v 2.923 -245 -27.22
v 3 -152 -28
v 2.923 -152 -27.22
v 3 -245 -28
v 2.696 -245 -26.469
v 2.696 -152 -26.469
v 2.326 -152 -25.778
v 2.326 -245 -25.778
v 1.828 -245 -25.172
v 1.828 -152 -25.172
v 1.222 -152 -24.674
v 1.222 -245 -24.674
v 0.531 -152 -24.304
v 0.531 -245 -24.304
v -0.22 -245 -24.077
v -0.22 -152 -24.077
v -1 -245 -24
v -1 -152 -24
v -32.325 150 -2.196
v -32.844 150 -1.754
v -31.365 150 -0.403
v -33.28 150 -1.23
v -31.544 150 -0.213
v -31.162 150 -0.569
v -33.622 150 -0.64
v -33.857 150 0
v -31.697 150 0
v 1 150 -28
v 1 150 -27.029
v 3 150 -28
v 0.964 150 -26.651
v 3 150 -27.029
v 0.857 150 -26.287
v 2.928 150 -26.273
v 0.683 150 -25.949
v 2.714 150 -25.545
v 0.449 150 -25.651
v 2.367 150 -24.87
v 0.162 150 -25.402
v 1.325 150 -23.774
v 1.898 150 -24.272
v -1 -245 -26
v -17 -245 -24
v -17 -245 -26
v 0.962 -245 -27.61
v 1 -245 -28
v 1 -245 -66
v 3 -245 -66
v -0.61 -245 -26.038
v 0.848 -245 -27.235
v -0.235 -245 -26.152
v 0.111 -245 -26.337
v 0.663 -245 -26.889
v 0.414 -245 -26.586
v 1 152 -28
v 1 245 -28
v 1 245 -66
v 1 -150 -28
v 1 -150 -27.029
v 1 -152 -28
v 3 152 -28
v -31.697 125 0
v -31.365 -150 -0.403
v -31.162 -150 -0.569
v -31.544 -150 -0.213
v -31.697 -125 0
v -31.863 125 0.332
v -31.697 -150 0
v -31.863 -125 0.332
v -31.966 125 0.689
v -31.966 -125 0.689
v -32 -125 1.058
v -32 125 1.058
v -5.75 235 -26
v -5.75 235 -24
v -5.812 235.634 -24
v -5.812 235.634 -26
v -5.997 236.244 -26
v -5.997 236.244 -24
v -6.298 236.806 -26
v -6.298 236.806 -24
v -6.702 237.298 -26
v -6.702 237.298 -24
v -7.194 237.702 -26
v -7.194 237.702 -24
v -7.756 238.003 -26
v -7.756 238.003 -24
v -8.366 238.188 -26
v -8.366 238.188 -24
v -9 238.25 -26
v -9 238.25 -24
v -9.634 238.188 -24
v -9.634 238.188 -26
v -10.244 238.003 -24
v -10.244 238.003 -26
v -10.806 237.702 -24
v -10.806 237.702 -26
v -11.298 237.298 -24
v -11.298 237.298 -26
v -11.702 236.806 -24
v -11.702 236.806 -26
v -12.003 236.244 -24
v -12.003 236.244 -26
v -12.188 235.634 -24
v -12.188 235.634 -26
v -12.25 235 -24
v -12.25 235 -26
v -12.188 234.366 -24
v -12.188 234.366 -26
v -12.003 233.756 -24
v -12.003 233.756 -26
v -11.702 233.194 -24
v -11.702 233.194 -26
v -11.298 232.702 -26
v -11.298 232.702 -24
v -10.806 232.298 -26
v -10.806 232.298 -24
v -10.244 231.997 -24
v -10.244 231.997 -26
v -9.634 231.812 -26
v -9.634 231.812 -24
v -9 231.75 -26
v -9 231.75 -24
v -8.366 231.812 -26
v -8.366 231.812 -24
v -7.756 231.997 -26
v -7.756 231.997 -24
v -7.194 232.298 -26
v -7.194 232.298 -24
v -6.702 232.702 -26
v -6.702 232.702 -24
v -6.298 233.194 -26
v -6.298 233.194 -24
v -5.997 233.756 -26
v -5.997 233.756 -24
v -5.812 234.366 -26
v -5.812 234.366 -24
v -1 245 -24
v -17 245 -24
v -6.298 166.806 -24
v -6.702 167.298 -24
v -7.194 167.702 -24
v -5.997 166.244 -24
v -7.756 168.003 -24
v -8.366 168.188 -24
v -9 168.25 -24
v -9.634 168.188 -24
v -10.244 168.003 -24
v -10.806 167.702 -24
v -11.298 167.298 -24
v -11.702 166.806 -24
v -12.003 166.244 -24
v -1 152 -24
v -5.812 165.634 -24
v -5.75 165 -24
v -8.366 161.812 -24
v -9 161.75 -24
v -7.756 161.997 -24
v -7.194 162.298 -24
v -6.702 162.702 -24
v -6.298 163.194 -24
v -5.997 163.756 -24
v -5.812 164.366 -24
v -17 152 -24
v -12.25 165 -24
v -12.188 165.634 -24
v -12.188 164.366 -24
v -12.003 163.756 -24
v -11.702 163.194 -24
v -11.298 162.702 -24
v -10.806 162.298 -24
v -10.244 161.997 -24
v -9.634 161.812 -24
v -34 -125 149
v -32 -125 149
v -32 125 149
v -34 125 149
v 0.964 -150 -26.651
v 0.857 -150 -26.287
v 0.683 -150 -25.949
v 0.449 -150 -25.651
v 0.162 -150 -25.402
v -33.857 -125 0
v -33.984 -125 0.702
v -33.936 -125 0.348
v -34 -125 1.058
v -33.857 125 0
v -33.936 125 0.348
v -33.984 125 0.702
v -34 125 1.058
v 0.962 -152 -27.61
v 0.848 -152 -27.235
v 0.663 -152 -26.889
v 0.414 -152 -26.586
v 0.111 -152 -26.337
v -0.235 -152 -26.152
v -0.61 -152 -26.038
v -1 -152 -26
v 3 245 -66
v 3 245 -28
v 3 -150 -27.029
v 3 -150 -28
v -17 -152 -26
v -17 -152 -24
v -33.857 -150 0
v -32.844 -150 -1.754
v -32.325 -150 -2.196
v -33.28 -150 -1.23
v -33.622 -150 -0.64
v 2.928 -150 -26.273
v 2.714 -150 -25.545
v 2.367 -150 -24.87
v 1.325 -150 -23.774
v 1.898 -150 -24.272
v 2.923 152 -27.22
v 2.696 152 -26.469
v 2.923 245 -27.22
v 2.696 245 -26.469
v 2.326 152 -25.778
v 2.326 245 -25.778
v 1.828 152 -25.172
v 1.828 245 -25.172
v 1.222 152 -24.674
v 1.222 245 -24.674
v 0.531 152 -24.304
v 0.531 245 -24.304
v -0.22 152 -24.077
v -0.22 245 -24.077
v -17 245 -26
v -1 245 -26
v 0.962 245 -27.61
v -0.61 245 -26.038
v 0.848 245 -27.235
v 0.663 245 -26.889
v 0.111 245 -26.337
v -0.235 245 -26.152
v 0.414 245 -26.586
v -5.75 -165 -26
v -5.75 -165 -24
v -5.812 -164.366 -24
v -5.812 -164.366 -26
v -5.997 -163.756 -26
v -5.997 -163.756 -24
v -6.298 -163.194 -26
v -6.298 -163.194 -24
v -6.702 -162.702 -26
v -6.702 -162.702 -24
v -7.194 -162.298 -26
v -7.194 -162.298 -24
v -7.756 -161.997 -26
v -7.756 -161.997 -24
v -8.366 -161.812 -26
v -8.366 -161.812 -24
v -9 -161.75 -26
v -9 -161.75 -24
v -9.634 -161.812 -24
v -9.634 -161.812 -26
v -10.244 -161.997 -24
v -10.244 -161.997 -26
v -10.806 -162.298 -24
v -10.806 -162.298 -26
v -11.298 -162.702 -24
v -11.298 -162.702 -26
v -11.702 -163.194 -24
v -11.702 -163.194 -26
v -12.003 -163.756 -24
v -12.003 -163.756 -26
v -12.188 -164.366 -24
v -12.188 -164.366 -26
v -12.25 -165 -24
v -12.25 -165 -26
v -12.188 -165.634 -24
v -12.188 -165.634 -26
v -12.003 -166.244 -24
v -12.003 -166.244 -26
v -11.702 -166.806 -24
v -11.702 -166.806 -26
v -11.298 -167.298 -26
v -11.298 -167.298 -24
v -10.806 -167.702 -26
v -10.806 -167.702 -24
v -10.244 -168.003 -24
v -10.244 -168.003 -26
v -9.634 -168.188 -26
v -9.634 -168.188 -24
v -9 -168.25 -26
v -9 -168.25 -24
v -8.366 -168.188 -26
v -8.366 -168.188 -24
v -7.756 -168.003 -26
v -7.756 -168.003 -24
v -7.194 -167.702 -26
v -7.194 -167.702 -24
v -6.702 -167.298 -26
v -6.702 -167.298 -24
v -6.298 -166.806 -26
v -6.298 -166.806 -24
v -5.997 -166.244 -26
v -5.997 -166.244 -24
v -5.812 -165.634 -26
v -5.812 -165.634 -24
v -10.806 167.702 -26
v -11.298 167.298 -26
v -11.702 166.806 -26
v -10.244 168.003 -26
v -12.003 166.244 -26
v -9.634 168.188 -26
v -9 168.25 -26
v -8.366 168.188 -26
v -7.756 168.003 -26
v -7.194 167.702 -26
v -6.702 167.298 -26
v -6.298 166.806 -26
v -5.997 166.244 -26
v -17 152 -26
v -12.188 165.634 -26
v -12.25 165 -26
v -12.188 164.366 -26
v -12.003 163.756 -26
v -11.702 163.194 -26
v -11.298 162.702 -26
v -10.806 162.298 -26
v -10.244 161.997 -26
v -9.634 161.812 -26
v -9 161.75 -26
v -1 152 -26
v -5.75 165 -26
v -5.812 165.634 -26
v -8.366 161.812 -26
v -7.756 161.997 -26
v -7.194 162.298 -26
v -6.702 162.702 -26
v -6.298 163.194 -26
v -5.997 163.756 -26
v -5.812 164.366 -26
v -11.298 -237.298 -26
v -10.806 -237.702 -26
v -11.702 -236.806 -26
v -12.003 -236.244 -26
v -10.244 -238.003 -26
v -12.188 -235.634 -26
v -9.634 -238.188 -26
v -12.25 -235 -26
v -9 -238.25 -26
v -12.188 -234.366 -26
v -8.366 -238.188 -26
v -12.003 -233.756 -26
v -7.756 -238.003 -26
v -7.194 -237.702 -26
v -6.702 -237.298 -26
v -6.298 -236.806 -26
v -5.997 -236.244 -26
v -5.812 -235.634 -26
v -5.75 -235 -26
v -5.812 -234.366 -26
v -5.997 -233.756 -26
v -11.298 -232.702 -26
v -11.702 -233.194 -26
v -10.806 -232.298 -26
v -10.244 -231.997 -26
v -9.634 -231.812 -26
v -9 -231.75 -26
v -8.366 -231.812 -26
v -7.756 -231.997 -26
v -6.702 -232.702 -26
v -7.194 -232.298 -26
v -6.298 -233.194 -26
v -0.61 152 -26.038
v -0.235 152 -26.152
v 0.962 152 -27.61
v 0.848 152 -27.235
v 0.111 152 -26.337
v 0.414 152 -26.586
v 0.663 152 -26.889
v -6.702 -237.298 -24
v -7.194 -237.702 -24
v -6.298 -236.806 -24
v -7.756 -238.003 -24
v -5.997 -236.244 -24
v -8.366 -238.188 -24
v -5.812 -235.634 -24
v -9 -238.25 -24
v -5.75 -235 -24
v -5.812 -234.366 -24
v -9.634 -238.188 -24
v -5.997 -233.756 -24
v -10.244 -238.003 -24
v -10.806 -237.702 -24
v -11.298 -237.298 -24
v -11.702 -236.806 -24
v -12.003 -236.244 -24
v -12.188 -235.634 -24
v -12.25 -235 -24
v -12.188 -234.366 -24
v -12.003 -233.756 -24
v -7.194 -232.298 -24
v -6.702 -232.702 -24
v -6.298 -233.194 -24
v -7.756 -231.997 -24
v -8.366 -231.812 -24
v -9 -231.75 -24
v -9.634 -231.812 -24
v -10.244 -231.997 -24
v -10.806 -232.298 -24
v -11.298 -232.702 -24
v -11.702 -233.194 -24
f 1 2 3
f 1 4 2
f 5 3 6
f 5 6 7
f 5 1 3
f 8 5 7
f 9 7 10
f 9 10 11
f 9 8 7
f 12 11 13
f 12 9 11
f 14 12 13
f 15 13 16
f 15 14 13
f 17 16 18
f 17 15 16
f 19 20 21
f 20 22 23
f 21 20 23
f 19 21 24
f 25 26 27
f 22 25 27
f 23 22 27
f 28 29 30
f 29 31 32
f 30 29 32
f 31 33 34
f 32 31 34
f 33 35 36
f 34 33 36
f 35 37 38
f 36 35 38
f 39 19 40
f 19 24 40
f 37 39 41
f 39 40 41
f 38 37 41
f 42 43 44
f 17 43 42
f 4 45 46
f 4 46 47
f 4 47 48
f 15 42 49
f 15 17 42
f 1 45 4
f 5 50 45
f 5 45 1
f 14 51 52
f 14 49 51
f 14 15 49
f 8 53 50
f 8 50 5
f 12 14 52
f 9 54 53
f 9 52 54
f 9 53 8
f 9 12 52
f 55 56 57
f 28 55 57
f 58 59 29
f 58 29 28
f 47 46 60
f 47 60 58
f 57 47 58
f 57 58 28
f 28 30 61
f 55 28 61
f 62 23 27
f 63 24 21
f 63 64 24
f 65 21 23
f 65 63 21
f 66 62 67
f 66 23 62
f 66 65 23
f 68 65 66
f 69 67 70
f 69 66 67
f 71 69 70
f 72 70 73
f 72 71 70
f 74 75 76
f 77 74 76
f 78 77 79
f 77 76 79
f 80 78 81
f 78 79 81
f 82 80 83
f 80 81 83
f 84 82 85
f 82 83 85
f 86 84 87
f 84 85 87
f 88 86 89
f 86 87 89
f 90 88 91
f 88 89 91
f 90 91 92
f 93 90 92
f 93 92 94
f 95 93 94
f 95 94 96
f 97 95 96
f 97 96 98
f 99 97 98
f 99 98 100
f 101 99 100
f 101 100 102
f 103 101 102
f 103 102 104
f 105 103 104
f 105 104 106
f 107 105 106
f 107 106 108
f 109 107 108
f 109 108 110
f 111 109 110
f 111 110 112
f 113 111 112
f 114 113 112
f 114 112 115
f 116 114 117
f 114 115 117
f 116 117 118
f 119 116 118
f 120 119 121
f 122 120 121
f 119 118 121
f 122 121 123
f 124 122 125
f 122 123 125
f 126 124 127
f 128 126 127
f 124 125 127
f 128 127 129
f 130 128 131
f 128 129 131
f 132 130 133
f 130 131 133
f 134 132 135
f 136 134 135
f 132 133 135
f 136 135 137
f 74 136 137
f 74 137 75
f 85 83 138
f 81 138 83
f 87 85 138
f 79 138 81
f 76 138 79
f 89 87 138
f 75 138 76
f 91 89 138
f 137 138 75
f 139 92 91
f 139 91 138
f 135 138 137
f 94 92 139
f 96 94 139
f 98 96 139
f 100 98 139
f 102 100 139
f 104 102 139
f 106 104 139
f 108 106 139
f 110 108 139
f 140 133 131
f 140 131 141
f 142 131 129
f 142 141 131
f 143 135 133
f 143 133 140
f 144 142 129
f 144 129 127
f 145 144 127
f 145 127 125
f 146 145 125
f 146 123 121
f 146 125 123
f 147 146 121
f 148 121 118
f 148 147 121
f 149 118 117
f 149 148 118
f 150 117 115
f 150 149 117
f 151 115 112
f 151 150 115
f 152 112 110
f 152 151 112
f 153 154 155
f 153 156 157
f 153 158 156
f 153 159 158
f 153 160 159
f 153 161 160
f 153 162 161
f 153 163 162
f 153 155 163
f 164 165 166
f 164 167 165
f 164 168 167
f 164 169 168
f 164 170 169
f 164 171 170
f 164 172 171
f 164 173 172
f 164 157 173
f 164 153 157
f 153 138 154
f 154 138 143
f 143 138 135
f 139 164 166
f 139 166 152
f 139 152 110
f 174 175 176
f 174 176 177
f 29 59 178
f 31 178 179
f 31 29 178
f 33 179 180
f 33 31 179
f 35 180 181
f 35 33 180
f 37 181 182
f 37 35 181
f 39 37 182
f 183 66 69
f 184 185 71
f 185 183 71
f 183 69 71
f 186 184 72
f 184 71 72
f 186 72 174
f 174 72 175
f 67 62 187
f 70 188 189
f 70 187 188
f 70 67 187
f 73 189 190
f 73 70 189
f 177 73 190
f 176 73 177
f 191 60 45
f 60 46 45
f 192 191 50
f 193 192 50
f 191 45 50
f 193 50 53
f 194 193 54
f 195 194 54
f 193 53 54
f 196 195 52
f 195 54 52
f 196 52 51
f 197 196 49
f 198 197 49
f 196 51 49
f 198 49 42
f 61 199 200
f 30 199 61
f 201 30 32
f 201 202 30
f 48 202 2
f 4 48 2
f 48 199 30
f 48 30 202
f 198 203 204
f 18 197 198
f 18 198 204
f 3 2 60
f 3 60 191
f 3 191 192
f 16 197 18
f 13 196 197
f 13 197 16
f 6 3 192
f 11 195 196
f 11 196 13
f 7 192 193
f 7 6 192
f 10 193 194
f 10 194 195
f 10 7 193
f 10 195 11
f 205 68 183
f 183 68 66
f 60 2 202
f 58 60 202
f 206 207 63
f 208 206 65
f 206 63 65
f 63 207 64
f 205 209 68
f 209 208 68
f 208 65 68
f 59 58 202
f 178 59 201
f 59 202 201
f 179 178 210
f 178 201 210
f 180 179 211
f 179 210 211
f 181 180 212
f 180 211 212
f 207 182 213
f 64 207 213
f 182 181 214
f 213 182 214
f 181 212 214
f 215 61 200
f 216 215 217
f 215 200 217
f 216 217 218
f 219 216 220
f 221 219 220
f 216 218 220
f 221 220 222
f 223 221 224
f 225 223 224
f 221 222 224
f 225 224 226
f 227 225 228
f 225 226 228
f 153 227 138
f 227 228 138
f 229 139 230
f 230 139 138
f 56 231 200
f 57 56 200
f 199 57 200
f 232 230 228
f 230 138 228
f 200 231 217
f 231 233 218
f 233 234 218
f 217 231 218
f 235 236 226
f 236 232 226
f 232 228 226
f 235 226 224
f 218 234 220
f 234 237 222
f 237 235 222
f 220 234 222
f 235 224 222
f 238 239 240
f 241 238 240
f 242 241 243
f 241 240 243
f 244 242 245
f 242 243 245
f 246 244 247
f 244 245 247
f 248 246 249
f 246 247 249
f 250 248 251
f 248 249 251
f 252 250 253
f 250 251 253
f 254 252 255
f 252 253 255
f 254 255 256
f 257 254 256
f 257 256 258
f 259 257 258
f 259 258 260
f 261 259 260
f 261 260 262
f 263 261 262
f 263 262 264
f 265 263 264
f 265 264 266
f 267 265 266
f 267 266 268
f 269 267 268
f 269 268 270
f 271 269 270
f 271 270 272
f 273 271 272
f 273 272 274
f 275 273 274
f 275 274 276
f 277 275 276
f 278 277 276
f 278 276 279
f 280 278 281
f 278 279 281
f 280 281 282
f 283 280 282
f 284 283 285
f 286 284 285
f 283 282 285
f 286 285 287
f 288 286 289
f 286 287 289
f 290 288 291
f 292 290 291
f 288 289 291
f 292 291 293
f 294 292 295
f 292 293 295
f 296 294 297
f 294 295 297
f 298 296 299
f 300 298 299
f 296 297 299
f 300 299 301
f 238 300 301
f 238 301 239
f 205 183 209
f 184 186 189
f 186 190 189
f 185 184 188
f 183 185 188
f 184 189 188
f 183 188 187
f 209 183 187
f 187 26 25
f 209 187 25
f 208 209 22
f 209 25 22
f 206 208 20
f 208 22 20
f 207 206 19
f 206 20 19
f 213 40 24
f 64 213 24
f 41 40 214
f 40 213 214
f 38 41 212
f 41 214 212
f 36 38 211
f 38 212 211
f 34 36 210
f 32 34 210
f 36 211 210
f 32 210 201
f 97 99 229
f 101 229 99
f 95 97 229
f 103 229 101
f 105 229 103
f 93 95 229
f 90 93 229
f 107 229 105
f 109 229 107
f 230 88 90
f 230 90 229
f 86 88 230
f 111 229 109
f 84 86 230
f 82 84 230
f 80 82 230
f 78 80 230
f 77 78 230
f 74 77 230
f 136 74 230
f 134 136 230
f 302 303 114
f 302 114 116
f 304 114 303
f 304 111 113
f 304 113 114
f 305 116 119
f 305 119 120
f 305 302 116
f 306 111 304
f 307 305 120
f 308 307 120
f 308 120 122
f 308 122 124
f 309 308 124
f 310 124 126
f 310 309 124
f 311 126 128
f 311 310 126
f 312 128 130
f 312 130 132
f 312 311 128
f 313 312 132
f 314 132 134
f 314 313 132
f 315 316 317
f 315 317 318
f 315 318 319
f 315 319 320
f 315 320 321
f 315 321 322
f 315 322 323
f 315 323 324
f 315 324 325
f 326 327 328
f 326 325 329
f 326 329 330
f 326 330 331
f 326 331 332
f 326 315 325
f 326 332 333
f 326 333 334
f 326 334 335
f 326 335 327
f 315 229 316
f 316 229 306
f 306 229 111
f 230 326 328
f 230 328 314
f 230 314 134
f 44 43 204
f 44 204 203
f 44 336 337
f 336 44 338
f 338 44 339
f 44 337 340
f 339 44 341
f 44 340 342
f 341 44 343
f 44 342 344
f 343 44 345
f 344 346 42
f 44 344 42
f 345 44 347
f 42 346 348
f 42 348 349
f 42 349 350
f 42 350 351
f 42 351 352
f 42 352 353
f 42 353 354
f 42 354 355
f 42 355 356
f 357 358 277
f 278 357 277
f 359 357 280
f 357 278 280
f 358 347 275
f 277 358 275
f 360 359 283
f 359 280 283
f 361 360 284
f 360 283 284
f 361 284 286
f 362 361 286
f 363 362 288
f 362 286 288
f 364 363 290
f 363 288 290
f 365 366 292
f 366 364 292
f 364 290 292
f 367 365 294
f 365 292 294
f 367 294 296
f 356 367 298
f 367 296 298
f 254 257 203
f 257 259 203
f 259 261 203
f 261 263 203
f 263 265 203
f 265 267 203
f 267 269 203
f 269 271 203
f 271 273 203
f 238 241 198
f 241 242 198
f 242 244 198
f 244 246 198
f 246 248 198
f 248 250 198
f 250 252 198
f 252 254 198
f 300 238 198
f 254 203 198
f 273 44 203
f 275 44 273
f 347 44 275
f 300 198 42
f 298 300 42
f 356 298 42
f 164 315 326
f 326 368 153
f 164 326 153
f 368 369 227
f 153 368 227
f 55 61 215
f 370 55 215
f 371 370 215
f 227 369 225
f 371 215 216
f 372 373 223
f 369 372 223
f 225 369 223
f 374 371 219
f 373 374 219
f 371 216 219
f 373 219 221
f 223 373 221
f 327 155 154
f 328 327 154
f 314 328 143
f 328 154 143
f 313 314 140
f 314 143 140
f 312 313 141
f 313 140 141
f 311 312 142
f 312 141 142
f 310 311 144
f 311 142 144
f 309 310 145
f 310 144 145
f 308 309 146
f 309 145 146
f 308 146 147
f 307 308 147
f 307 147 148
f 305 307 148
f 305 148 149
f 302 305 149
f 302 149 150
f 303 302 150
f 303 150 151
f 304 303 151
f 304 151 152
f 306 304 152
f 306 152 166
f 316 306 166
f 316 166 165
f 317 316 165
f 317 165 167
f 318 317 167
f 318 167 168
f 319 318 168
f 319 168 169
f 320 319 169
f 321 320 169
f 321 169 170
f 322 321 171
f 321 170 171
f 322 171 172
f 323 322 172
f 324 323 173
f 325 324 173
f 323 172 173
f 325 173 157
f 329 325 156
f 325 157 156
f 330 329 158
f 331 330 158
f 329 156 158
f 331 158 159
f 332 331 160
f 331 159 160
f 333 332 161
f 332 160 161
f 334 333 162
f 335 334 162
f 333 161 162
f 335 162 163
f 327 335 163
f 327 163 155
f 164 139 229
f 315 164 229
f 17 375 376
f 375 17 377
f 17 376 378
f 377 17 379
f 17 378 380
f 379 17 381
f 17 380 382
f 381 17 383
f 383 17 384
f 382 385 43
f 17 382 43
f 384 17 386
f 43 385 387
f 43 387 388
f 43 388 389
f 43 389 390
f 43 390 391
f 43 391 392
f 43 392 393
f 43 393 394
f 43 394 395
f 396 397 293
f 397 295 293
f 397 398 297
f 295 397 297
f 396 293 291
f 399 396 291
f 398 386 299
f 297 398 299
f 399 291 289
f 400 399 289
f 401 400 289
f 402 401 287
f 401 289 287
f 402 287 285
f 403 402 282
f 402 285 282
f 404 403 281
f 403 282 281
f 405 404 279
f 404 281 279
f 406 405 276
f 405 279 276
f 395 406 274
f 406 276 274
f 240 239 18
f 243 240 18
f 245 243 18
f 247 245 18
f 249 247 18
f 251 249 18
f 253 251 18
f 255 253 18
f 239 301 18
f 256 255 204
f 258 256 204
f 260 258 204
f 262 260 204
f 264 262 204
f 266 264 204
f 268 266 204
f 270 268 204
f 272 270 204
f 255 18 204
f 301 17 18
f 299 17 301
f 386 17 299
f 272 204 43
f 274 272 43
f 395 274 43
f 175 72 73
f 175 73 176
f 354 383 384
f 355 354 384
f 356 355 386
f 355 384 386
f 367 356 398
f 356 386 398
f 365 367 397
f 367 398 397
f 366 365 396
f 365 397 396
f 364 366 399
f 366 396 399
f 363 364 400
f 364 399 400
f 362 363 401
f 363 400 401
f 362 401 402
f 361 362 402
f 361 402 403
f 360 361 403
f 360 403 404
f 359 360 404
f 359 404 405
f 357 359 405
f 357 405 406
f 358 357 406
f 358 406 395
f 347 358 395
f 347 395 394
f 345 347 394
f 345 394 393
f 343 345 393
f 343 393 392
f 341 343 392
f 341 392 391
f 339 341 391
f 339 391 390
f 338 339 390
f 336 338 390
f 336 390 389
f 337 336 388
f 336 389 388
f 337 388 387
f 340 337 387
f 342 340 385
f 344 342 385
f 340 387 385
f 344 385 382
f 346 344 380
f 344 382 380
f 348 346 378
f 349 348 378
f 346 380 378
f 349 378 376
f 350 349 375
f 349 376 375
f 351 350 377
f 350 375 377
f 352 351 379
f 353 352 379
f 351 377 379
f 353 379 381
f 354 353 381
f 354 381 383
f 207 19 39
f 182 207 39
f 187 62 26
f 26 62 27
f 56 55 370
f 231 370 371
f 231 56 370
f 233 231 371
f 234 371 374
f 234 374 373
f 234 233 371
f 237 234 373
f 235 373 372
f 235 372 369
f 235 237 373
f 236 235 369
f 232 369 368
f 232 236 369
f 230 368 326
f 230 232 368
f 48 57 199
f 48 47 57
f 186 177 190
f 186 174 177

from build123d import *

# Parameters (mm, degrees)
F1_DEPTH  = 150
F3_DEPTH  = 95
F4_W      = 2
F4_H      = 56
F6_DEPTH  = 25
F5_W      = 55.4491758279
F5_H      = 188.3780552482
F7_DEPTH  = 50
F8_R      = 2
F9_R      = 4
F10_R     = 3.25
F11_DEPTH = 25


# Not quite as in the source:
# - a pattern or mirror of a feature is missing from the dataset's text; its kind, count and spacing are read off the source's solid


with BuildPart() as f1:
    # F0 (on Front) → F1 (new body, symmetric)
    with BuildSketch(Plane.XZ):
        Polygon((1, -26), (1, -66), (3, -66), (3, -24.9707642094), (-32, 0.0292357906), (-32, 149), (-34, 149), (-34, -1), align=None)
    extrude(amount=F1_DEPTH, both=True)

    # F2 (on face) → F3 (join)
    with BuildSketch(Plane.XZ.offset(150)):
        Polygon((1.6409301068, -24), (3, -24.9707642094), (3, -24), align=None)
        Polygon((-17, -26), (1, -26), (-1.8, -24), (-17, -24), align=None)
        Polygon((1, -27.0292357906), (1, -66), (3, -66), (3, -24.9707642094), (1.6409301068, -24), (-1.8, -24), (1, -26), align=None)
    f3 = extrude(amount=F3_DEPTH)

    # F3_copies: F3 across plane
    add(f3.mirror(Plane.ZX))

    # F4 (on face) → F6 (cut)
    with BuildSketch(Plane.YZ.offset(3)):
        with Locations((-151, 0)):
            Rectangle(F4_W, F4_H)
        with Locations((151, 0)):
            Rectangle(F4_W, F4_H)
    extrude(amount=-F6_DEPTH, mode=Mode.SUBTRACT)

    # F5 (on face) → F7 (cut)
    with BuildSketch(Plane.YZ.offset(3)):
        with Locations((152.724587914, 94.1890276241)):
            Rectangle(F5_W, F5_H)
        with Locations((-152.724587914, 94.1890276241)):
            Rectangle(F5_W, F5_H)
    extrude(amount=-F7_DEPTH, mode=Mode.SUBTRACT)

    # F8
    f8_edges = [f1.edges().sort_by_distance(p)[0] for p in [
        (-32, 0, 0.029236),
        (1, -198.5, -26),
        (1, 0, -26),
        (1, 198.5, -26),
    ]]
    fillet(f8_edges, radius=F8_R)

    # F9
    f9_edges = [f1.edges().sort_by_distance(p)[0] for p in [
        (3, -198.5, -24),
        (3, 0, -24.970764),
        (-34, 0, -1),
        (3, 198.5, -24),
    ]]
    fillet(f9_edges, radius=F9_R)

    # F10 (on face) → F11 (cut)
    with BuildSketch(Plane.XY.offset(-24)):
        with Locations((-9, 235)):
            Circle(F10_R)
        with Locations((-9, 165)):
            Circle(F10_R)
        with Locations((-9, -165)):
            Circle(F10_R)
        with Locations((-9, -235)):
            Circle(F10_R)
    extrude(amount=-F11_DEPTH, mode=Mode.SUBTRACT)


solid = f1.part
